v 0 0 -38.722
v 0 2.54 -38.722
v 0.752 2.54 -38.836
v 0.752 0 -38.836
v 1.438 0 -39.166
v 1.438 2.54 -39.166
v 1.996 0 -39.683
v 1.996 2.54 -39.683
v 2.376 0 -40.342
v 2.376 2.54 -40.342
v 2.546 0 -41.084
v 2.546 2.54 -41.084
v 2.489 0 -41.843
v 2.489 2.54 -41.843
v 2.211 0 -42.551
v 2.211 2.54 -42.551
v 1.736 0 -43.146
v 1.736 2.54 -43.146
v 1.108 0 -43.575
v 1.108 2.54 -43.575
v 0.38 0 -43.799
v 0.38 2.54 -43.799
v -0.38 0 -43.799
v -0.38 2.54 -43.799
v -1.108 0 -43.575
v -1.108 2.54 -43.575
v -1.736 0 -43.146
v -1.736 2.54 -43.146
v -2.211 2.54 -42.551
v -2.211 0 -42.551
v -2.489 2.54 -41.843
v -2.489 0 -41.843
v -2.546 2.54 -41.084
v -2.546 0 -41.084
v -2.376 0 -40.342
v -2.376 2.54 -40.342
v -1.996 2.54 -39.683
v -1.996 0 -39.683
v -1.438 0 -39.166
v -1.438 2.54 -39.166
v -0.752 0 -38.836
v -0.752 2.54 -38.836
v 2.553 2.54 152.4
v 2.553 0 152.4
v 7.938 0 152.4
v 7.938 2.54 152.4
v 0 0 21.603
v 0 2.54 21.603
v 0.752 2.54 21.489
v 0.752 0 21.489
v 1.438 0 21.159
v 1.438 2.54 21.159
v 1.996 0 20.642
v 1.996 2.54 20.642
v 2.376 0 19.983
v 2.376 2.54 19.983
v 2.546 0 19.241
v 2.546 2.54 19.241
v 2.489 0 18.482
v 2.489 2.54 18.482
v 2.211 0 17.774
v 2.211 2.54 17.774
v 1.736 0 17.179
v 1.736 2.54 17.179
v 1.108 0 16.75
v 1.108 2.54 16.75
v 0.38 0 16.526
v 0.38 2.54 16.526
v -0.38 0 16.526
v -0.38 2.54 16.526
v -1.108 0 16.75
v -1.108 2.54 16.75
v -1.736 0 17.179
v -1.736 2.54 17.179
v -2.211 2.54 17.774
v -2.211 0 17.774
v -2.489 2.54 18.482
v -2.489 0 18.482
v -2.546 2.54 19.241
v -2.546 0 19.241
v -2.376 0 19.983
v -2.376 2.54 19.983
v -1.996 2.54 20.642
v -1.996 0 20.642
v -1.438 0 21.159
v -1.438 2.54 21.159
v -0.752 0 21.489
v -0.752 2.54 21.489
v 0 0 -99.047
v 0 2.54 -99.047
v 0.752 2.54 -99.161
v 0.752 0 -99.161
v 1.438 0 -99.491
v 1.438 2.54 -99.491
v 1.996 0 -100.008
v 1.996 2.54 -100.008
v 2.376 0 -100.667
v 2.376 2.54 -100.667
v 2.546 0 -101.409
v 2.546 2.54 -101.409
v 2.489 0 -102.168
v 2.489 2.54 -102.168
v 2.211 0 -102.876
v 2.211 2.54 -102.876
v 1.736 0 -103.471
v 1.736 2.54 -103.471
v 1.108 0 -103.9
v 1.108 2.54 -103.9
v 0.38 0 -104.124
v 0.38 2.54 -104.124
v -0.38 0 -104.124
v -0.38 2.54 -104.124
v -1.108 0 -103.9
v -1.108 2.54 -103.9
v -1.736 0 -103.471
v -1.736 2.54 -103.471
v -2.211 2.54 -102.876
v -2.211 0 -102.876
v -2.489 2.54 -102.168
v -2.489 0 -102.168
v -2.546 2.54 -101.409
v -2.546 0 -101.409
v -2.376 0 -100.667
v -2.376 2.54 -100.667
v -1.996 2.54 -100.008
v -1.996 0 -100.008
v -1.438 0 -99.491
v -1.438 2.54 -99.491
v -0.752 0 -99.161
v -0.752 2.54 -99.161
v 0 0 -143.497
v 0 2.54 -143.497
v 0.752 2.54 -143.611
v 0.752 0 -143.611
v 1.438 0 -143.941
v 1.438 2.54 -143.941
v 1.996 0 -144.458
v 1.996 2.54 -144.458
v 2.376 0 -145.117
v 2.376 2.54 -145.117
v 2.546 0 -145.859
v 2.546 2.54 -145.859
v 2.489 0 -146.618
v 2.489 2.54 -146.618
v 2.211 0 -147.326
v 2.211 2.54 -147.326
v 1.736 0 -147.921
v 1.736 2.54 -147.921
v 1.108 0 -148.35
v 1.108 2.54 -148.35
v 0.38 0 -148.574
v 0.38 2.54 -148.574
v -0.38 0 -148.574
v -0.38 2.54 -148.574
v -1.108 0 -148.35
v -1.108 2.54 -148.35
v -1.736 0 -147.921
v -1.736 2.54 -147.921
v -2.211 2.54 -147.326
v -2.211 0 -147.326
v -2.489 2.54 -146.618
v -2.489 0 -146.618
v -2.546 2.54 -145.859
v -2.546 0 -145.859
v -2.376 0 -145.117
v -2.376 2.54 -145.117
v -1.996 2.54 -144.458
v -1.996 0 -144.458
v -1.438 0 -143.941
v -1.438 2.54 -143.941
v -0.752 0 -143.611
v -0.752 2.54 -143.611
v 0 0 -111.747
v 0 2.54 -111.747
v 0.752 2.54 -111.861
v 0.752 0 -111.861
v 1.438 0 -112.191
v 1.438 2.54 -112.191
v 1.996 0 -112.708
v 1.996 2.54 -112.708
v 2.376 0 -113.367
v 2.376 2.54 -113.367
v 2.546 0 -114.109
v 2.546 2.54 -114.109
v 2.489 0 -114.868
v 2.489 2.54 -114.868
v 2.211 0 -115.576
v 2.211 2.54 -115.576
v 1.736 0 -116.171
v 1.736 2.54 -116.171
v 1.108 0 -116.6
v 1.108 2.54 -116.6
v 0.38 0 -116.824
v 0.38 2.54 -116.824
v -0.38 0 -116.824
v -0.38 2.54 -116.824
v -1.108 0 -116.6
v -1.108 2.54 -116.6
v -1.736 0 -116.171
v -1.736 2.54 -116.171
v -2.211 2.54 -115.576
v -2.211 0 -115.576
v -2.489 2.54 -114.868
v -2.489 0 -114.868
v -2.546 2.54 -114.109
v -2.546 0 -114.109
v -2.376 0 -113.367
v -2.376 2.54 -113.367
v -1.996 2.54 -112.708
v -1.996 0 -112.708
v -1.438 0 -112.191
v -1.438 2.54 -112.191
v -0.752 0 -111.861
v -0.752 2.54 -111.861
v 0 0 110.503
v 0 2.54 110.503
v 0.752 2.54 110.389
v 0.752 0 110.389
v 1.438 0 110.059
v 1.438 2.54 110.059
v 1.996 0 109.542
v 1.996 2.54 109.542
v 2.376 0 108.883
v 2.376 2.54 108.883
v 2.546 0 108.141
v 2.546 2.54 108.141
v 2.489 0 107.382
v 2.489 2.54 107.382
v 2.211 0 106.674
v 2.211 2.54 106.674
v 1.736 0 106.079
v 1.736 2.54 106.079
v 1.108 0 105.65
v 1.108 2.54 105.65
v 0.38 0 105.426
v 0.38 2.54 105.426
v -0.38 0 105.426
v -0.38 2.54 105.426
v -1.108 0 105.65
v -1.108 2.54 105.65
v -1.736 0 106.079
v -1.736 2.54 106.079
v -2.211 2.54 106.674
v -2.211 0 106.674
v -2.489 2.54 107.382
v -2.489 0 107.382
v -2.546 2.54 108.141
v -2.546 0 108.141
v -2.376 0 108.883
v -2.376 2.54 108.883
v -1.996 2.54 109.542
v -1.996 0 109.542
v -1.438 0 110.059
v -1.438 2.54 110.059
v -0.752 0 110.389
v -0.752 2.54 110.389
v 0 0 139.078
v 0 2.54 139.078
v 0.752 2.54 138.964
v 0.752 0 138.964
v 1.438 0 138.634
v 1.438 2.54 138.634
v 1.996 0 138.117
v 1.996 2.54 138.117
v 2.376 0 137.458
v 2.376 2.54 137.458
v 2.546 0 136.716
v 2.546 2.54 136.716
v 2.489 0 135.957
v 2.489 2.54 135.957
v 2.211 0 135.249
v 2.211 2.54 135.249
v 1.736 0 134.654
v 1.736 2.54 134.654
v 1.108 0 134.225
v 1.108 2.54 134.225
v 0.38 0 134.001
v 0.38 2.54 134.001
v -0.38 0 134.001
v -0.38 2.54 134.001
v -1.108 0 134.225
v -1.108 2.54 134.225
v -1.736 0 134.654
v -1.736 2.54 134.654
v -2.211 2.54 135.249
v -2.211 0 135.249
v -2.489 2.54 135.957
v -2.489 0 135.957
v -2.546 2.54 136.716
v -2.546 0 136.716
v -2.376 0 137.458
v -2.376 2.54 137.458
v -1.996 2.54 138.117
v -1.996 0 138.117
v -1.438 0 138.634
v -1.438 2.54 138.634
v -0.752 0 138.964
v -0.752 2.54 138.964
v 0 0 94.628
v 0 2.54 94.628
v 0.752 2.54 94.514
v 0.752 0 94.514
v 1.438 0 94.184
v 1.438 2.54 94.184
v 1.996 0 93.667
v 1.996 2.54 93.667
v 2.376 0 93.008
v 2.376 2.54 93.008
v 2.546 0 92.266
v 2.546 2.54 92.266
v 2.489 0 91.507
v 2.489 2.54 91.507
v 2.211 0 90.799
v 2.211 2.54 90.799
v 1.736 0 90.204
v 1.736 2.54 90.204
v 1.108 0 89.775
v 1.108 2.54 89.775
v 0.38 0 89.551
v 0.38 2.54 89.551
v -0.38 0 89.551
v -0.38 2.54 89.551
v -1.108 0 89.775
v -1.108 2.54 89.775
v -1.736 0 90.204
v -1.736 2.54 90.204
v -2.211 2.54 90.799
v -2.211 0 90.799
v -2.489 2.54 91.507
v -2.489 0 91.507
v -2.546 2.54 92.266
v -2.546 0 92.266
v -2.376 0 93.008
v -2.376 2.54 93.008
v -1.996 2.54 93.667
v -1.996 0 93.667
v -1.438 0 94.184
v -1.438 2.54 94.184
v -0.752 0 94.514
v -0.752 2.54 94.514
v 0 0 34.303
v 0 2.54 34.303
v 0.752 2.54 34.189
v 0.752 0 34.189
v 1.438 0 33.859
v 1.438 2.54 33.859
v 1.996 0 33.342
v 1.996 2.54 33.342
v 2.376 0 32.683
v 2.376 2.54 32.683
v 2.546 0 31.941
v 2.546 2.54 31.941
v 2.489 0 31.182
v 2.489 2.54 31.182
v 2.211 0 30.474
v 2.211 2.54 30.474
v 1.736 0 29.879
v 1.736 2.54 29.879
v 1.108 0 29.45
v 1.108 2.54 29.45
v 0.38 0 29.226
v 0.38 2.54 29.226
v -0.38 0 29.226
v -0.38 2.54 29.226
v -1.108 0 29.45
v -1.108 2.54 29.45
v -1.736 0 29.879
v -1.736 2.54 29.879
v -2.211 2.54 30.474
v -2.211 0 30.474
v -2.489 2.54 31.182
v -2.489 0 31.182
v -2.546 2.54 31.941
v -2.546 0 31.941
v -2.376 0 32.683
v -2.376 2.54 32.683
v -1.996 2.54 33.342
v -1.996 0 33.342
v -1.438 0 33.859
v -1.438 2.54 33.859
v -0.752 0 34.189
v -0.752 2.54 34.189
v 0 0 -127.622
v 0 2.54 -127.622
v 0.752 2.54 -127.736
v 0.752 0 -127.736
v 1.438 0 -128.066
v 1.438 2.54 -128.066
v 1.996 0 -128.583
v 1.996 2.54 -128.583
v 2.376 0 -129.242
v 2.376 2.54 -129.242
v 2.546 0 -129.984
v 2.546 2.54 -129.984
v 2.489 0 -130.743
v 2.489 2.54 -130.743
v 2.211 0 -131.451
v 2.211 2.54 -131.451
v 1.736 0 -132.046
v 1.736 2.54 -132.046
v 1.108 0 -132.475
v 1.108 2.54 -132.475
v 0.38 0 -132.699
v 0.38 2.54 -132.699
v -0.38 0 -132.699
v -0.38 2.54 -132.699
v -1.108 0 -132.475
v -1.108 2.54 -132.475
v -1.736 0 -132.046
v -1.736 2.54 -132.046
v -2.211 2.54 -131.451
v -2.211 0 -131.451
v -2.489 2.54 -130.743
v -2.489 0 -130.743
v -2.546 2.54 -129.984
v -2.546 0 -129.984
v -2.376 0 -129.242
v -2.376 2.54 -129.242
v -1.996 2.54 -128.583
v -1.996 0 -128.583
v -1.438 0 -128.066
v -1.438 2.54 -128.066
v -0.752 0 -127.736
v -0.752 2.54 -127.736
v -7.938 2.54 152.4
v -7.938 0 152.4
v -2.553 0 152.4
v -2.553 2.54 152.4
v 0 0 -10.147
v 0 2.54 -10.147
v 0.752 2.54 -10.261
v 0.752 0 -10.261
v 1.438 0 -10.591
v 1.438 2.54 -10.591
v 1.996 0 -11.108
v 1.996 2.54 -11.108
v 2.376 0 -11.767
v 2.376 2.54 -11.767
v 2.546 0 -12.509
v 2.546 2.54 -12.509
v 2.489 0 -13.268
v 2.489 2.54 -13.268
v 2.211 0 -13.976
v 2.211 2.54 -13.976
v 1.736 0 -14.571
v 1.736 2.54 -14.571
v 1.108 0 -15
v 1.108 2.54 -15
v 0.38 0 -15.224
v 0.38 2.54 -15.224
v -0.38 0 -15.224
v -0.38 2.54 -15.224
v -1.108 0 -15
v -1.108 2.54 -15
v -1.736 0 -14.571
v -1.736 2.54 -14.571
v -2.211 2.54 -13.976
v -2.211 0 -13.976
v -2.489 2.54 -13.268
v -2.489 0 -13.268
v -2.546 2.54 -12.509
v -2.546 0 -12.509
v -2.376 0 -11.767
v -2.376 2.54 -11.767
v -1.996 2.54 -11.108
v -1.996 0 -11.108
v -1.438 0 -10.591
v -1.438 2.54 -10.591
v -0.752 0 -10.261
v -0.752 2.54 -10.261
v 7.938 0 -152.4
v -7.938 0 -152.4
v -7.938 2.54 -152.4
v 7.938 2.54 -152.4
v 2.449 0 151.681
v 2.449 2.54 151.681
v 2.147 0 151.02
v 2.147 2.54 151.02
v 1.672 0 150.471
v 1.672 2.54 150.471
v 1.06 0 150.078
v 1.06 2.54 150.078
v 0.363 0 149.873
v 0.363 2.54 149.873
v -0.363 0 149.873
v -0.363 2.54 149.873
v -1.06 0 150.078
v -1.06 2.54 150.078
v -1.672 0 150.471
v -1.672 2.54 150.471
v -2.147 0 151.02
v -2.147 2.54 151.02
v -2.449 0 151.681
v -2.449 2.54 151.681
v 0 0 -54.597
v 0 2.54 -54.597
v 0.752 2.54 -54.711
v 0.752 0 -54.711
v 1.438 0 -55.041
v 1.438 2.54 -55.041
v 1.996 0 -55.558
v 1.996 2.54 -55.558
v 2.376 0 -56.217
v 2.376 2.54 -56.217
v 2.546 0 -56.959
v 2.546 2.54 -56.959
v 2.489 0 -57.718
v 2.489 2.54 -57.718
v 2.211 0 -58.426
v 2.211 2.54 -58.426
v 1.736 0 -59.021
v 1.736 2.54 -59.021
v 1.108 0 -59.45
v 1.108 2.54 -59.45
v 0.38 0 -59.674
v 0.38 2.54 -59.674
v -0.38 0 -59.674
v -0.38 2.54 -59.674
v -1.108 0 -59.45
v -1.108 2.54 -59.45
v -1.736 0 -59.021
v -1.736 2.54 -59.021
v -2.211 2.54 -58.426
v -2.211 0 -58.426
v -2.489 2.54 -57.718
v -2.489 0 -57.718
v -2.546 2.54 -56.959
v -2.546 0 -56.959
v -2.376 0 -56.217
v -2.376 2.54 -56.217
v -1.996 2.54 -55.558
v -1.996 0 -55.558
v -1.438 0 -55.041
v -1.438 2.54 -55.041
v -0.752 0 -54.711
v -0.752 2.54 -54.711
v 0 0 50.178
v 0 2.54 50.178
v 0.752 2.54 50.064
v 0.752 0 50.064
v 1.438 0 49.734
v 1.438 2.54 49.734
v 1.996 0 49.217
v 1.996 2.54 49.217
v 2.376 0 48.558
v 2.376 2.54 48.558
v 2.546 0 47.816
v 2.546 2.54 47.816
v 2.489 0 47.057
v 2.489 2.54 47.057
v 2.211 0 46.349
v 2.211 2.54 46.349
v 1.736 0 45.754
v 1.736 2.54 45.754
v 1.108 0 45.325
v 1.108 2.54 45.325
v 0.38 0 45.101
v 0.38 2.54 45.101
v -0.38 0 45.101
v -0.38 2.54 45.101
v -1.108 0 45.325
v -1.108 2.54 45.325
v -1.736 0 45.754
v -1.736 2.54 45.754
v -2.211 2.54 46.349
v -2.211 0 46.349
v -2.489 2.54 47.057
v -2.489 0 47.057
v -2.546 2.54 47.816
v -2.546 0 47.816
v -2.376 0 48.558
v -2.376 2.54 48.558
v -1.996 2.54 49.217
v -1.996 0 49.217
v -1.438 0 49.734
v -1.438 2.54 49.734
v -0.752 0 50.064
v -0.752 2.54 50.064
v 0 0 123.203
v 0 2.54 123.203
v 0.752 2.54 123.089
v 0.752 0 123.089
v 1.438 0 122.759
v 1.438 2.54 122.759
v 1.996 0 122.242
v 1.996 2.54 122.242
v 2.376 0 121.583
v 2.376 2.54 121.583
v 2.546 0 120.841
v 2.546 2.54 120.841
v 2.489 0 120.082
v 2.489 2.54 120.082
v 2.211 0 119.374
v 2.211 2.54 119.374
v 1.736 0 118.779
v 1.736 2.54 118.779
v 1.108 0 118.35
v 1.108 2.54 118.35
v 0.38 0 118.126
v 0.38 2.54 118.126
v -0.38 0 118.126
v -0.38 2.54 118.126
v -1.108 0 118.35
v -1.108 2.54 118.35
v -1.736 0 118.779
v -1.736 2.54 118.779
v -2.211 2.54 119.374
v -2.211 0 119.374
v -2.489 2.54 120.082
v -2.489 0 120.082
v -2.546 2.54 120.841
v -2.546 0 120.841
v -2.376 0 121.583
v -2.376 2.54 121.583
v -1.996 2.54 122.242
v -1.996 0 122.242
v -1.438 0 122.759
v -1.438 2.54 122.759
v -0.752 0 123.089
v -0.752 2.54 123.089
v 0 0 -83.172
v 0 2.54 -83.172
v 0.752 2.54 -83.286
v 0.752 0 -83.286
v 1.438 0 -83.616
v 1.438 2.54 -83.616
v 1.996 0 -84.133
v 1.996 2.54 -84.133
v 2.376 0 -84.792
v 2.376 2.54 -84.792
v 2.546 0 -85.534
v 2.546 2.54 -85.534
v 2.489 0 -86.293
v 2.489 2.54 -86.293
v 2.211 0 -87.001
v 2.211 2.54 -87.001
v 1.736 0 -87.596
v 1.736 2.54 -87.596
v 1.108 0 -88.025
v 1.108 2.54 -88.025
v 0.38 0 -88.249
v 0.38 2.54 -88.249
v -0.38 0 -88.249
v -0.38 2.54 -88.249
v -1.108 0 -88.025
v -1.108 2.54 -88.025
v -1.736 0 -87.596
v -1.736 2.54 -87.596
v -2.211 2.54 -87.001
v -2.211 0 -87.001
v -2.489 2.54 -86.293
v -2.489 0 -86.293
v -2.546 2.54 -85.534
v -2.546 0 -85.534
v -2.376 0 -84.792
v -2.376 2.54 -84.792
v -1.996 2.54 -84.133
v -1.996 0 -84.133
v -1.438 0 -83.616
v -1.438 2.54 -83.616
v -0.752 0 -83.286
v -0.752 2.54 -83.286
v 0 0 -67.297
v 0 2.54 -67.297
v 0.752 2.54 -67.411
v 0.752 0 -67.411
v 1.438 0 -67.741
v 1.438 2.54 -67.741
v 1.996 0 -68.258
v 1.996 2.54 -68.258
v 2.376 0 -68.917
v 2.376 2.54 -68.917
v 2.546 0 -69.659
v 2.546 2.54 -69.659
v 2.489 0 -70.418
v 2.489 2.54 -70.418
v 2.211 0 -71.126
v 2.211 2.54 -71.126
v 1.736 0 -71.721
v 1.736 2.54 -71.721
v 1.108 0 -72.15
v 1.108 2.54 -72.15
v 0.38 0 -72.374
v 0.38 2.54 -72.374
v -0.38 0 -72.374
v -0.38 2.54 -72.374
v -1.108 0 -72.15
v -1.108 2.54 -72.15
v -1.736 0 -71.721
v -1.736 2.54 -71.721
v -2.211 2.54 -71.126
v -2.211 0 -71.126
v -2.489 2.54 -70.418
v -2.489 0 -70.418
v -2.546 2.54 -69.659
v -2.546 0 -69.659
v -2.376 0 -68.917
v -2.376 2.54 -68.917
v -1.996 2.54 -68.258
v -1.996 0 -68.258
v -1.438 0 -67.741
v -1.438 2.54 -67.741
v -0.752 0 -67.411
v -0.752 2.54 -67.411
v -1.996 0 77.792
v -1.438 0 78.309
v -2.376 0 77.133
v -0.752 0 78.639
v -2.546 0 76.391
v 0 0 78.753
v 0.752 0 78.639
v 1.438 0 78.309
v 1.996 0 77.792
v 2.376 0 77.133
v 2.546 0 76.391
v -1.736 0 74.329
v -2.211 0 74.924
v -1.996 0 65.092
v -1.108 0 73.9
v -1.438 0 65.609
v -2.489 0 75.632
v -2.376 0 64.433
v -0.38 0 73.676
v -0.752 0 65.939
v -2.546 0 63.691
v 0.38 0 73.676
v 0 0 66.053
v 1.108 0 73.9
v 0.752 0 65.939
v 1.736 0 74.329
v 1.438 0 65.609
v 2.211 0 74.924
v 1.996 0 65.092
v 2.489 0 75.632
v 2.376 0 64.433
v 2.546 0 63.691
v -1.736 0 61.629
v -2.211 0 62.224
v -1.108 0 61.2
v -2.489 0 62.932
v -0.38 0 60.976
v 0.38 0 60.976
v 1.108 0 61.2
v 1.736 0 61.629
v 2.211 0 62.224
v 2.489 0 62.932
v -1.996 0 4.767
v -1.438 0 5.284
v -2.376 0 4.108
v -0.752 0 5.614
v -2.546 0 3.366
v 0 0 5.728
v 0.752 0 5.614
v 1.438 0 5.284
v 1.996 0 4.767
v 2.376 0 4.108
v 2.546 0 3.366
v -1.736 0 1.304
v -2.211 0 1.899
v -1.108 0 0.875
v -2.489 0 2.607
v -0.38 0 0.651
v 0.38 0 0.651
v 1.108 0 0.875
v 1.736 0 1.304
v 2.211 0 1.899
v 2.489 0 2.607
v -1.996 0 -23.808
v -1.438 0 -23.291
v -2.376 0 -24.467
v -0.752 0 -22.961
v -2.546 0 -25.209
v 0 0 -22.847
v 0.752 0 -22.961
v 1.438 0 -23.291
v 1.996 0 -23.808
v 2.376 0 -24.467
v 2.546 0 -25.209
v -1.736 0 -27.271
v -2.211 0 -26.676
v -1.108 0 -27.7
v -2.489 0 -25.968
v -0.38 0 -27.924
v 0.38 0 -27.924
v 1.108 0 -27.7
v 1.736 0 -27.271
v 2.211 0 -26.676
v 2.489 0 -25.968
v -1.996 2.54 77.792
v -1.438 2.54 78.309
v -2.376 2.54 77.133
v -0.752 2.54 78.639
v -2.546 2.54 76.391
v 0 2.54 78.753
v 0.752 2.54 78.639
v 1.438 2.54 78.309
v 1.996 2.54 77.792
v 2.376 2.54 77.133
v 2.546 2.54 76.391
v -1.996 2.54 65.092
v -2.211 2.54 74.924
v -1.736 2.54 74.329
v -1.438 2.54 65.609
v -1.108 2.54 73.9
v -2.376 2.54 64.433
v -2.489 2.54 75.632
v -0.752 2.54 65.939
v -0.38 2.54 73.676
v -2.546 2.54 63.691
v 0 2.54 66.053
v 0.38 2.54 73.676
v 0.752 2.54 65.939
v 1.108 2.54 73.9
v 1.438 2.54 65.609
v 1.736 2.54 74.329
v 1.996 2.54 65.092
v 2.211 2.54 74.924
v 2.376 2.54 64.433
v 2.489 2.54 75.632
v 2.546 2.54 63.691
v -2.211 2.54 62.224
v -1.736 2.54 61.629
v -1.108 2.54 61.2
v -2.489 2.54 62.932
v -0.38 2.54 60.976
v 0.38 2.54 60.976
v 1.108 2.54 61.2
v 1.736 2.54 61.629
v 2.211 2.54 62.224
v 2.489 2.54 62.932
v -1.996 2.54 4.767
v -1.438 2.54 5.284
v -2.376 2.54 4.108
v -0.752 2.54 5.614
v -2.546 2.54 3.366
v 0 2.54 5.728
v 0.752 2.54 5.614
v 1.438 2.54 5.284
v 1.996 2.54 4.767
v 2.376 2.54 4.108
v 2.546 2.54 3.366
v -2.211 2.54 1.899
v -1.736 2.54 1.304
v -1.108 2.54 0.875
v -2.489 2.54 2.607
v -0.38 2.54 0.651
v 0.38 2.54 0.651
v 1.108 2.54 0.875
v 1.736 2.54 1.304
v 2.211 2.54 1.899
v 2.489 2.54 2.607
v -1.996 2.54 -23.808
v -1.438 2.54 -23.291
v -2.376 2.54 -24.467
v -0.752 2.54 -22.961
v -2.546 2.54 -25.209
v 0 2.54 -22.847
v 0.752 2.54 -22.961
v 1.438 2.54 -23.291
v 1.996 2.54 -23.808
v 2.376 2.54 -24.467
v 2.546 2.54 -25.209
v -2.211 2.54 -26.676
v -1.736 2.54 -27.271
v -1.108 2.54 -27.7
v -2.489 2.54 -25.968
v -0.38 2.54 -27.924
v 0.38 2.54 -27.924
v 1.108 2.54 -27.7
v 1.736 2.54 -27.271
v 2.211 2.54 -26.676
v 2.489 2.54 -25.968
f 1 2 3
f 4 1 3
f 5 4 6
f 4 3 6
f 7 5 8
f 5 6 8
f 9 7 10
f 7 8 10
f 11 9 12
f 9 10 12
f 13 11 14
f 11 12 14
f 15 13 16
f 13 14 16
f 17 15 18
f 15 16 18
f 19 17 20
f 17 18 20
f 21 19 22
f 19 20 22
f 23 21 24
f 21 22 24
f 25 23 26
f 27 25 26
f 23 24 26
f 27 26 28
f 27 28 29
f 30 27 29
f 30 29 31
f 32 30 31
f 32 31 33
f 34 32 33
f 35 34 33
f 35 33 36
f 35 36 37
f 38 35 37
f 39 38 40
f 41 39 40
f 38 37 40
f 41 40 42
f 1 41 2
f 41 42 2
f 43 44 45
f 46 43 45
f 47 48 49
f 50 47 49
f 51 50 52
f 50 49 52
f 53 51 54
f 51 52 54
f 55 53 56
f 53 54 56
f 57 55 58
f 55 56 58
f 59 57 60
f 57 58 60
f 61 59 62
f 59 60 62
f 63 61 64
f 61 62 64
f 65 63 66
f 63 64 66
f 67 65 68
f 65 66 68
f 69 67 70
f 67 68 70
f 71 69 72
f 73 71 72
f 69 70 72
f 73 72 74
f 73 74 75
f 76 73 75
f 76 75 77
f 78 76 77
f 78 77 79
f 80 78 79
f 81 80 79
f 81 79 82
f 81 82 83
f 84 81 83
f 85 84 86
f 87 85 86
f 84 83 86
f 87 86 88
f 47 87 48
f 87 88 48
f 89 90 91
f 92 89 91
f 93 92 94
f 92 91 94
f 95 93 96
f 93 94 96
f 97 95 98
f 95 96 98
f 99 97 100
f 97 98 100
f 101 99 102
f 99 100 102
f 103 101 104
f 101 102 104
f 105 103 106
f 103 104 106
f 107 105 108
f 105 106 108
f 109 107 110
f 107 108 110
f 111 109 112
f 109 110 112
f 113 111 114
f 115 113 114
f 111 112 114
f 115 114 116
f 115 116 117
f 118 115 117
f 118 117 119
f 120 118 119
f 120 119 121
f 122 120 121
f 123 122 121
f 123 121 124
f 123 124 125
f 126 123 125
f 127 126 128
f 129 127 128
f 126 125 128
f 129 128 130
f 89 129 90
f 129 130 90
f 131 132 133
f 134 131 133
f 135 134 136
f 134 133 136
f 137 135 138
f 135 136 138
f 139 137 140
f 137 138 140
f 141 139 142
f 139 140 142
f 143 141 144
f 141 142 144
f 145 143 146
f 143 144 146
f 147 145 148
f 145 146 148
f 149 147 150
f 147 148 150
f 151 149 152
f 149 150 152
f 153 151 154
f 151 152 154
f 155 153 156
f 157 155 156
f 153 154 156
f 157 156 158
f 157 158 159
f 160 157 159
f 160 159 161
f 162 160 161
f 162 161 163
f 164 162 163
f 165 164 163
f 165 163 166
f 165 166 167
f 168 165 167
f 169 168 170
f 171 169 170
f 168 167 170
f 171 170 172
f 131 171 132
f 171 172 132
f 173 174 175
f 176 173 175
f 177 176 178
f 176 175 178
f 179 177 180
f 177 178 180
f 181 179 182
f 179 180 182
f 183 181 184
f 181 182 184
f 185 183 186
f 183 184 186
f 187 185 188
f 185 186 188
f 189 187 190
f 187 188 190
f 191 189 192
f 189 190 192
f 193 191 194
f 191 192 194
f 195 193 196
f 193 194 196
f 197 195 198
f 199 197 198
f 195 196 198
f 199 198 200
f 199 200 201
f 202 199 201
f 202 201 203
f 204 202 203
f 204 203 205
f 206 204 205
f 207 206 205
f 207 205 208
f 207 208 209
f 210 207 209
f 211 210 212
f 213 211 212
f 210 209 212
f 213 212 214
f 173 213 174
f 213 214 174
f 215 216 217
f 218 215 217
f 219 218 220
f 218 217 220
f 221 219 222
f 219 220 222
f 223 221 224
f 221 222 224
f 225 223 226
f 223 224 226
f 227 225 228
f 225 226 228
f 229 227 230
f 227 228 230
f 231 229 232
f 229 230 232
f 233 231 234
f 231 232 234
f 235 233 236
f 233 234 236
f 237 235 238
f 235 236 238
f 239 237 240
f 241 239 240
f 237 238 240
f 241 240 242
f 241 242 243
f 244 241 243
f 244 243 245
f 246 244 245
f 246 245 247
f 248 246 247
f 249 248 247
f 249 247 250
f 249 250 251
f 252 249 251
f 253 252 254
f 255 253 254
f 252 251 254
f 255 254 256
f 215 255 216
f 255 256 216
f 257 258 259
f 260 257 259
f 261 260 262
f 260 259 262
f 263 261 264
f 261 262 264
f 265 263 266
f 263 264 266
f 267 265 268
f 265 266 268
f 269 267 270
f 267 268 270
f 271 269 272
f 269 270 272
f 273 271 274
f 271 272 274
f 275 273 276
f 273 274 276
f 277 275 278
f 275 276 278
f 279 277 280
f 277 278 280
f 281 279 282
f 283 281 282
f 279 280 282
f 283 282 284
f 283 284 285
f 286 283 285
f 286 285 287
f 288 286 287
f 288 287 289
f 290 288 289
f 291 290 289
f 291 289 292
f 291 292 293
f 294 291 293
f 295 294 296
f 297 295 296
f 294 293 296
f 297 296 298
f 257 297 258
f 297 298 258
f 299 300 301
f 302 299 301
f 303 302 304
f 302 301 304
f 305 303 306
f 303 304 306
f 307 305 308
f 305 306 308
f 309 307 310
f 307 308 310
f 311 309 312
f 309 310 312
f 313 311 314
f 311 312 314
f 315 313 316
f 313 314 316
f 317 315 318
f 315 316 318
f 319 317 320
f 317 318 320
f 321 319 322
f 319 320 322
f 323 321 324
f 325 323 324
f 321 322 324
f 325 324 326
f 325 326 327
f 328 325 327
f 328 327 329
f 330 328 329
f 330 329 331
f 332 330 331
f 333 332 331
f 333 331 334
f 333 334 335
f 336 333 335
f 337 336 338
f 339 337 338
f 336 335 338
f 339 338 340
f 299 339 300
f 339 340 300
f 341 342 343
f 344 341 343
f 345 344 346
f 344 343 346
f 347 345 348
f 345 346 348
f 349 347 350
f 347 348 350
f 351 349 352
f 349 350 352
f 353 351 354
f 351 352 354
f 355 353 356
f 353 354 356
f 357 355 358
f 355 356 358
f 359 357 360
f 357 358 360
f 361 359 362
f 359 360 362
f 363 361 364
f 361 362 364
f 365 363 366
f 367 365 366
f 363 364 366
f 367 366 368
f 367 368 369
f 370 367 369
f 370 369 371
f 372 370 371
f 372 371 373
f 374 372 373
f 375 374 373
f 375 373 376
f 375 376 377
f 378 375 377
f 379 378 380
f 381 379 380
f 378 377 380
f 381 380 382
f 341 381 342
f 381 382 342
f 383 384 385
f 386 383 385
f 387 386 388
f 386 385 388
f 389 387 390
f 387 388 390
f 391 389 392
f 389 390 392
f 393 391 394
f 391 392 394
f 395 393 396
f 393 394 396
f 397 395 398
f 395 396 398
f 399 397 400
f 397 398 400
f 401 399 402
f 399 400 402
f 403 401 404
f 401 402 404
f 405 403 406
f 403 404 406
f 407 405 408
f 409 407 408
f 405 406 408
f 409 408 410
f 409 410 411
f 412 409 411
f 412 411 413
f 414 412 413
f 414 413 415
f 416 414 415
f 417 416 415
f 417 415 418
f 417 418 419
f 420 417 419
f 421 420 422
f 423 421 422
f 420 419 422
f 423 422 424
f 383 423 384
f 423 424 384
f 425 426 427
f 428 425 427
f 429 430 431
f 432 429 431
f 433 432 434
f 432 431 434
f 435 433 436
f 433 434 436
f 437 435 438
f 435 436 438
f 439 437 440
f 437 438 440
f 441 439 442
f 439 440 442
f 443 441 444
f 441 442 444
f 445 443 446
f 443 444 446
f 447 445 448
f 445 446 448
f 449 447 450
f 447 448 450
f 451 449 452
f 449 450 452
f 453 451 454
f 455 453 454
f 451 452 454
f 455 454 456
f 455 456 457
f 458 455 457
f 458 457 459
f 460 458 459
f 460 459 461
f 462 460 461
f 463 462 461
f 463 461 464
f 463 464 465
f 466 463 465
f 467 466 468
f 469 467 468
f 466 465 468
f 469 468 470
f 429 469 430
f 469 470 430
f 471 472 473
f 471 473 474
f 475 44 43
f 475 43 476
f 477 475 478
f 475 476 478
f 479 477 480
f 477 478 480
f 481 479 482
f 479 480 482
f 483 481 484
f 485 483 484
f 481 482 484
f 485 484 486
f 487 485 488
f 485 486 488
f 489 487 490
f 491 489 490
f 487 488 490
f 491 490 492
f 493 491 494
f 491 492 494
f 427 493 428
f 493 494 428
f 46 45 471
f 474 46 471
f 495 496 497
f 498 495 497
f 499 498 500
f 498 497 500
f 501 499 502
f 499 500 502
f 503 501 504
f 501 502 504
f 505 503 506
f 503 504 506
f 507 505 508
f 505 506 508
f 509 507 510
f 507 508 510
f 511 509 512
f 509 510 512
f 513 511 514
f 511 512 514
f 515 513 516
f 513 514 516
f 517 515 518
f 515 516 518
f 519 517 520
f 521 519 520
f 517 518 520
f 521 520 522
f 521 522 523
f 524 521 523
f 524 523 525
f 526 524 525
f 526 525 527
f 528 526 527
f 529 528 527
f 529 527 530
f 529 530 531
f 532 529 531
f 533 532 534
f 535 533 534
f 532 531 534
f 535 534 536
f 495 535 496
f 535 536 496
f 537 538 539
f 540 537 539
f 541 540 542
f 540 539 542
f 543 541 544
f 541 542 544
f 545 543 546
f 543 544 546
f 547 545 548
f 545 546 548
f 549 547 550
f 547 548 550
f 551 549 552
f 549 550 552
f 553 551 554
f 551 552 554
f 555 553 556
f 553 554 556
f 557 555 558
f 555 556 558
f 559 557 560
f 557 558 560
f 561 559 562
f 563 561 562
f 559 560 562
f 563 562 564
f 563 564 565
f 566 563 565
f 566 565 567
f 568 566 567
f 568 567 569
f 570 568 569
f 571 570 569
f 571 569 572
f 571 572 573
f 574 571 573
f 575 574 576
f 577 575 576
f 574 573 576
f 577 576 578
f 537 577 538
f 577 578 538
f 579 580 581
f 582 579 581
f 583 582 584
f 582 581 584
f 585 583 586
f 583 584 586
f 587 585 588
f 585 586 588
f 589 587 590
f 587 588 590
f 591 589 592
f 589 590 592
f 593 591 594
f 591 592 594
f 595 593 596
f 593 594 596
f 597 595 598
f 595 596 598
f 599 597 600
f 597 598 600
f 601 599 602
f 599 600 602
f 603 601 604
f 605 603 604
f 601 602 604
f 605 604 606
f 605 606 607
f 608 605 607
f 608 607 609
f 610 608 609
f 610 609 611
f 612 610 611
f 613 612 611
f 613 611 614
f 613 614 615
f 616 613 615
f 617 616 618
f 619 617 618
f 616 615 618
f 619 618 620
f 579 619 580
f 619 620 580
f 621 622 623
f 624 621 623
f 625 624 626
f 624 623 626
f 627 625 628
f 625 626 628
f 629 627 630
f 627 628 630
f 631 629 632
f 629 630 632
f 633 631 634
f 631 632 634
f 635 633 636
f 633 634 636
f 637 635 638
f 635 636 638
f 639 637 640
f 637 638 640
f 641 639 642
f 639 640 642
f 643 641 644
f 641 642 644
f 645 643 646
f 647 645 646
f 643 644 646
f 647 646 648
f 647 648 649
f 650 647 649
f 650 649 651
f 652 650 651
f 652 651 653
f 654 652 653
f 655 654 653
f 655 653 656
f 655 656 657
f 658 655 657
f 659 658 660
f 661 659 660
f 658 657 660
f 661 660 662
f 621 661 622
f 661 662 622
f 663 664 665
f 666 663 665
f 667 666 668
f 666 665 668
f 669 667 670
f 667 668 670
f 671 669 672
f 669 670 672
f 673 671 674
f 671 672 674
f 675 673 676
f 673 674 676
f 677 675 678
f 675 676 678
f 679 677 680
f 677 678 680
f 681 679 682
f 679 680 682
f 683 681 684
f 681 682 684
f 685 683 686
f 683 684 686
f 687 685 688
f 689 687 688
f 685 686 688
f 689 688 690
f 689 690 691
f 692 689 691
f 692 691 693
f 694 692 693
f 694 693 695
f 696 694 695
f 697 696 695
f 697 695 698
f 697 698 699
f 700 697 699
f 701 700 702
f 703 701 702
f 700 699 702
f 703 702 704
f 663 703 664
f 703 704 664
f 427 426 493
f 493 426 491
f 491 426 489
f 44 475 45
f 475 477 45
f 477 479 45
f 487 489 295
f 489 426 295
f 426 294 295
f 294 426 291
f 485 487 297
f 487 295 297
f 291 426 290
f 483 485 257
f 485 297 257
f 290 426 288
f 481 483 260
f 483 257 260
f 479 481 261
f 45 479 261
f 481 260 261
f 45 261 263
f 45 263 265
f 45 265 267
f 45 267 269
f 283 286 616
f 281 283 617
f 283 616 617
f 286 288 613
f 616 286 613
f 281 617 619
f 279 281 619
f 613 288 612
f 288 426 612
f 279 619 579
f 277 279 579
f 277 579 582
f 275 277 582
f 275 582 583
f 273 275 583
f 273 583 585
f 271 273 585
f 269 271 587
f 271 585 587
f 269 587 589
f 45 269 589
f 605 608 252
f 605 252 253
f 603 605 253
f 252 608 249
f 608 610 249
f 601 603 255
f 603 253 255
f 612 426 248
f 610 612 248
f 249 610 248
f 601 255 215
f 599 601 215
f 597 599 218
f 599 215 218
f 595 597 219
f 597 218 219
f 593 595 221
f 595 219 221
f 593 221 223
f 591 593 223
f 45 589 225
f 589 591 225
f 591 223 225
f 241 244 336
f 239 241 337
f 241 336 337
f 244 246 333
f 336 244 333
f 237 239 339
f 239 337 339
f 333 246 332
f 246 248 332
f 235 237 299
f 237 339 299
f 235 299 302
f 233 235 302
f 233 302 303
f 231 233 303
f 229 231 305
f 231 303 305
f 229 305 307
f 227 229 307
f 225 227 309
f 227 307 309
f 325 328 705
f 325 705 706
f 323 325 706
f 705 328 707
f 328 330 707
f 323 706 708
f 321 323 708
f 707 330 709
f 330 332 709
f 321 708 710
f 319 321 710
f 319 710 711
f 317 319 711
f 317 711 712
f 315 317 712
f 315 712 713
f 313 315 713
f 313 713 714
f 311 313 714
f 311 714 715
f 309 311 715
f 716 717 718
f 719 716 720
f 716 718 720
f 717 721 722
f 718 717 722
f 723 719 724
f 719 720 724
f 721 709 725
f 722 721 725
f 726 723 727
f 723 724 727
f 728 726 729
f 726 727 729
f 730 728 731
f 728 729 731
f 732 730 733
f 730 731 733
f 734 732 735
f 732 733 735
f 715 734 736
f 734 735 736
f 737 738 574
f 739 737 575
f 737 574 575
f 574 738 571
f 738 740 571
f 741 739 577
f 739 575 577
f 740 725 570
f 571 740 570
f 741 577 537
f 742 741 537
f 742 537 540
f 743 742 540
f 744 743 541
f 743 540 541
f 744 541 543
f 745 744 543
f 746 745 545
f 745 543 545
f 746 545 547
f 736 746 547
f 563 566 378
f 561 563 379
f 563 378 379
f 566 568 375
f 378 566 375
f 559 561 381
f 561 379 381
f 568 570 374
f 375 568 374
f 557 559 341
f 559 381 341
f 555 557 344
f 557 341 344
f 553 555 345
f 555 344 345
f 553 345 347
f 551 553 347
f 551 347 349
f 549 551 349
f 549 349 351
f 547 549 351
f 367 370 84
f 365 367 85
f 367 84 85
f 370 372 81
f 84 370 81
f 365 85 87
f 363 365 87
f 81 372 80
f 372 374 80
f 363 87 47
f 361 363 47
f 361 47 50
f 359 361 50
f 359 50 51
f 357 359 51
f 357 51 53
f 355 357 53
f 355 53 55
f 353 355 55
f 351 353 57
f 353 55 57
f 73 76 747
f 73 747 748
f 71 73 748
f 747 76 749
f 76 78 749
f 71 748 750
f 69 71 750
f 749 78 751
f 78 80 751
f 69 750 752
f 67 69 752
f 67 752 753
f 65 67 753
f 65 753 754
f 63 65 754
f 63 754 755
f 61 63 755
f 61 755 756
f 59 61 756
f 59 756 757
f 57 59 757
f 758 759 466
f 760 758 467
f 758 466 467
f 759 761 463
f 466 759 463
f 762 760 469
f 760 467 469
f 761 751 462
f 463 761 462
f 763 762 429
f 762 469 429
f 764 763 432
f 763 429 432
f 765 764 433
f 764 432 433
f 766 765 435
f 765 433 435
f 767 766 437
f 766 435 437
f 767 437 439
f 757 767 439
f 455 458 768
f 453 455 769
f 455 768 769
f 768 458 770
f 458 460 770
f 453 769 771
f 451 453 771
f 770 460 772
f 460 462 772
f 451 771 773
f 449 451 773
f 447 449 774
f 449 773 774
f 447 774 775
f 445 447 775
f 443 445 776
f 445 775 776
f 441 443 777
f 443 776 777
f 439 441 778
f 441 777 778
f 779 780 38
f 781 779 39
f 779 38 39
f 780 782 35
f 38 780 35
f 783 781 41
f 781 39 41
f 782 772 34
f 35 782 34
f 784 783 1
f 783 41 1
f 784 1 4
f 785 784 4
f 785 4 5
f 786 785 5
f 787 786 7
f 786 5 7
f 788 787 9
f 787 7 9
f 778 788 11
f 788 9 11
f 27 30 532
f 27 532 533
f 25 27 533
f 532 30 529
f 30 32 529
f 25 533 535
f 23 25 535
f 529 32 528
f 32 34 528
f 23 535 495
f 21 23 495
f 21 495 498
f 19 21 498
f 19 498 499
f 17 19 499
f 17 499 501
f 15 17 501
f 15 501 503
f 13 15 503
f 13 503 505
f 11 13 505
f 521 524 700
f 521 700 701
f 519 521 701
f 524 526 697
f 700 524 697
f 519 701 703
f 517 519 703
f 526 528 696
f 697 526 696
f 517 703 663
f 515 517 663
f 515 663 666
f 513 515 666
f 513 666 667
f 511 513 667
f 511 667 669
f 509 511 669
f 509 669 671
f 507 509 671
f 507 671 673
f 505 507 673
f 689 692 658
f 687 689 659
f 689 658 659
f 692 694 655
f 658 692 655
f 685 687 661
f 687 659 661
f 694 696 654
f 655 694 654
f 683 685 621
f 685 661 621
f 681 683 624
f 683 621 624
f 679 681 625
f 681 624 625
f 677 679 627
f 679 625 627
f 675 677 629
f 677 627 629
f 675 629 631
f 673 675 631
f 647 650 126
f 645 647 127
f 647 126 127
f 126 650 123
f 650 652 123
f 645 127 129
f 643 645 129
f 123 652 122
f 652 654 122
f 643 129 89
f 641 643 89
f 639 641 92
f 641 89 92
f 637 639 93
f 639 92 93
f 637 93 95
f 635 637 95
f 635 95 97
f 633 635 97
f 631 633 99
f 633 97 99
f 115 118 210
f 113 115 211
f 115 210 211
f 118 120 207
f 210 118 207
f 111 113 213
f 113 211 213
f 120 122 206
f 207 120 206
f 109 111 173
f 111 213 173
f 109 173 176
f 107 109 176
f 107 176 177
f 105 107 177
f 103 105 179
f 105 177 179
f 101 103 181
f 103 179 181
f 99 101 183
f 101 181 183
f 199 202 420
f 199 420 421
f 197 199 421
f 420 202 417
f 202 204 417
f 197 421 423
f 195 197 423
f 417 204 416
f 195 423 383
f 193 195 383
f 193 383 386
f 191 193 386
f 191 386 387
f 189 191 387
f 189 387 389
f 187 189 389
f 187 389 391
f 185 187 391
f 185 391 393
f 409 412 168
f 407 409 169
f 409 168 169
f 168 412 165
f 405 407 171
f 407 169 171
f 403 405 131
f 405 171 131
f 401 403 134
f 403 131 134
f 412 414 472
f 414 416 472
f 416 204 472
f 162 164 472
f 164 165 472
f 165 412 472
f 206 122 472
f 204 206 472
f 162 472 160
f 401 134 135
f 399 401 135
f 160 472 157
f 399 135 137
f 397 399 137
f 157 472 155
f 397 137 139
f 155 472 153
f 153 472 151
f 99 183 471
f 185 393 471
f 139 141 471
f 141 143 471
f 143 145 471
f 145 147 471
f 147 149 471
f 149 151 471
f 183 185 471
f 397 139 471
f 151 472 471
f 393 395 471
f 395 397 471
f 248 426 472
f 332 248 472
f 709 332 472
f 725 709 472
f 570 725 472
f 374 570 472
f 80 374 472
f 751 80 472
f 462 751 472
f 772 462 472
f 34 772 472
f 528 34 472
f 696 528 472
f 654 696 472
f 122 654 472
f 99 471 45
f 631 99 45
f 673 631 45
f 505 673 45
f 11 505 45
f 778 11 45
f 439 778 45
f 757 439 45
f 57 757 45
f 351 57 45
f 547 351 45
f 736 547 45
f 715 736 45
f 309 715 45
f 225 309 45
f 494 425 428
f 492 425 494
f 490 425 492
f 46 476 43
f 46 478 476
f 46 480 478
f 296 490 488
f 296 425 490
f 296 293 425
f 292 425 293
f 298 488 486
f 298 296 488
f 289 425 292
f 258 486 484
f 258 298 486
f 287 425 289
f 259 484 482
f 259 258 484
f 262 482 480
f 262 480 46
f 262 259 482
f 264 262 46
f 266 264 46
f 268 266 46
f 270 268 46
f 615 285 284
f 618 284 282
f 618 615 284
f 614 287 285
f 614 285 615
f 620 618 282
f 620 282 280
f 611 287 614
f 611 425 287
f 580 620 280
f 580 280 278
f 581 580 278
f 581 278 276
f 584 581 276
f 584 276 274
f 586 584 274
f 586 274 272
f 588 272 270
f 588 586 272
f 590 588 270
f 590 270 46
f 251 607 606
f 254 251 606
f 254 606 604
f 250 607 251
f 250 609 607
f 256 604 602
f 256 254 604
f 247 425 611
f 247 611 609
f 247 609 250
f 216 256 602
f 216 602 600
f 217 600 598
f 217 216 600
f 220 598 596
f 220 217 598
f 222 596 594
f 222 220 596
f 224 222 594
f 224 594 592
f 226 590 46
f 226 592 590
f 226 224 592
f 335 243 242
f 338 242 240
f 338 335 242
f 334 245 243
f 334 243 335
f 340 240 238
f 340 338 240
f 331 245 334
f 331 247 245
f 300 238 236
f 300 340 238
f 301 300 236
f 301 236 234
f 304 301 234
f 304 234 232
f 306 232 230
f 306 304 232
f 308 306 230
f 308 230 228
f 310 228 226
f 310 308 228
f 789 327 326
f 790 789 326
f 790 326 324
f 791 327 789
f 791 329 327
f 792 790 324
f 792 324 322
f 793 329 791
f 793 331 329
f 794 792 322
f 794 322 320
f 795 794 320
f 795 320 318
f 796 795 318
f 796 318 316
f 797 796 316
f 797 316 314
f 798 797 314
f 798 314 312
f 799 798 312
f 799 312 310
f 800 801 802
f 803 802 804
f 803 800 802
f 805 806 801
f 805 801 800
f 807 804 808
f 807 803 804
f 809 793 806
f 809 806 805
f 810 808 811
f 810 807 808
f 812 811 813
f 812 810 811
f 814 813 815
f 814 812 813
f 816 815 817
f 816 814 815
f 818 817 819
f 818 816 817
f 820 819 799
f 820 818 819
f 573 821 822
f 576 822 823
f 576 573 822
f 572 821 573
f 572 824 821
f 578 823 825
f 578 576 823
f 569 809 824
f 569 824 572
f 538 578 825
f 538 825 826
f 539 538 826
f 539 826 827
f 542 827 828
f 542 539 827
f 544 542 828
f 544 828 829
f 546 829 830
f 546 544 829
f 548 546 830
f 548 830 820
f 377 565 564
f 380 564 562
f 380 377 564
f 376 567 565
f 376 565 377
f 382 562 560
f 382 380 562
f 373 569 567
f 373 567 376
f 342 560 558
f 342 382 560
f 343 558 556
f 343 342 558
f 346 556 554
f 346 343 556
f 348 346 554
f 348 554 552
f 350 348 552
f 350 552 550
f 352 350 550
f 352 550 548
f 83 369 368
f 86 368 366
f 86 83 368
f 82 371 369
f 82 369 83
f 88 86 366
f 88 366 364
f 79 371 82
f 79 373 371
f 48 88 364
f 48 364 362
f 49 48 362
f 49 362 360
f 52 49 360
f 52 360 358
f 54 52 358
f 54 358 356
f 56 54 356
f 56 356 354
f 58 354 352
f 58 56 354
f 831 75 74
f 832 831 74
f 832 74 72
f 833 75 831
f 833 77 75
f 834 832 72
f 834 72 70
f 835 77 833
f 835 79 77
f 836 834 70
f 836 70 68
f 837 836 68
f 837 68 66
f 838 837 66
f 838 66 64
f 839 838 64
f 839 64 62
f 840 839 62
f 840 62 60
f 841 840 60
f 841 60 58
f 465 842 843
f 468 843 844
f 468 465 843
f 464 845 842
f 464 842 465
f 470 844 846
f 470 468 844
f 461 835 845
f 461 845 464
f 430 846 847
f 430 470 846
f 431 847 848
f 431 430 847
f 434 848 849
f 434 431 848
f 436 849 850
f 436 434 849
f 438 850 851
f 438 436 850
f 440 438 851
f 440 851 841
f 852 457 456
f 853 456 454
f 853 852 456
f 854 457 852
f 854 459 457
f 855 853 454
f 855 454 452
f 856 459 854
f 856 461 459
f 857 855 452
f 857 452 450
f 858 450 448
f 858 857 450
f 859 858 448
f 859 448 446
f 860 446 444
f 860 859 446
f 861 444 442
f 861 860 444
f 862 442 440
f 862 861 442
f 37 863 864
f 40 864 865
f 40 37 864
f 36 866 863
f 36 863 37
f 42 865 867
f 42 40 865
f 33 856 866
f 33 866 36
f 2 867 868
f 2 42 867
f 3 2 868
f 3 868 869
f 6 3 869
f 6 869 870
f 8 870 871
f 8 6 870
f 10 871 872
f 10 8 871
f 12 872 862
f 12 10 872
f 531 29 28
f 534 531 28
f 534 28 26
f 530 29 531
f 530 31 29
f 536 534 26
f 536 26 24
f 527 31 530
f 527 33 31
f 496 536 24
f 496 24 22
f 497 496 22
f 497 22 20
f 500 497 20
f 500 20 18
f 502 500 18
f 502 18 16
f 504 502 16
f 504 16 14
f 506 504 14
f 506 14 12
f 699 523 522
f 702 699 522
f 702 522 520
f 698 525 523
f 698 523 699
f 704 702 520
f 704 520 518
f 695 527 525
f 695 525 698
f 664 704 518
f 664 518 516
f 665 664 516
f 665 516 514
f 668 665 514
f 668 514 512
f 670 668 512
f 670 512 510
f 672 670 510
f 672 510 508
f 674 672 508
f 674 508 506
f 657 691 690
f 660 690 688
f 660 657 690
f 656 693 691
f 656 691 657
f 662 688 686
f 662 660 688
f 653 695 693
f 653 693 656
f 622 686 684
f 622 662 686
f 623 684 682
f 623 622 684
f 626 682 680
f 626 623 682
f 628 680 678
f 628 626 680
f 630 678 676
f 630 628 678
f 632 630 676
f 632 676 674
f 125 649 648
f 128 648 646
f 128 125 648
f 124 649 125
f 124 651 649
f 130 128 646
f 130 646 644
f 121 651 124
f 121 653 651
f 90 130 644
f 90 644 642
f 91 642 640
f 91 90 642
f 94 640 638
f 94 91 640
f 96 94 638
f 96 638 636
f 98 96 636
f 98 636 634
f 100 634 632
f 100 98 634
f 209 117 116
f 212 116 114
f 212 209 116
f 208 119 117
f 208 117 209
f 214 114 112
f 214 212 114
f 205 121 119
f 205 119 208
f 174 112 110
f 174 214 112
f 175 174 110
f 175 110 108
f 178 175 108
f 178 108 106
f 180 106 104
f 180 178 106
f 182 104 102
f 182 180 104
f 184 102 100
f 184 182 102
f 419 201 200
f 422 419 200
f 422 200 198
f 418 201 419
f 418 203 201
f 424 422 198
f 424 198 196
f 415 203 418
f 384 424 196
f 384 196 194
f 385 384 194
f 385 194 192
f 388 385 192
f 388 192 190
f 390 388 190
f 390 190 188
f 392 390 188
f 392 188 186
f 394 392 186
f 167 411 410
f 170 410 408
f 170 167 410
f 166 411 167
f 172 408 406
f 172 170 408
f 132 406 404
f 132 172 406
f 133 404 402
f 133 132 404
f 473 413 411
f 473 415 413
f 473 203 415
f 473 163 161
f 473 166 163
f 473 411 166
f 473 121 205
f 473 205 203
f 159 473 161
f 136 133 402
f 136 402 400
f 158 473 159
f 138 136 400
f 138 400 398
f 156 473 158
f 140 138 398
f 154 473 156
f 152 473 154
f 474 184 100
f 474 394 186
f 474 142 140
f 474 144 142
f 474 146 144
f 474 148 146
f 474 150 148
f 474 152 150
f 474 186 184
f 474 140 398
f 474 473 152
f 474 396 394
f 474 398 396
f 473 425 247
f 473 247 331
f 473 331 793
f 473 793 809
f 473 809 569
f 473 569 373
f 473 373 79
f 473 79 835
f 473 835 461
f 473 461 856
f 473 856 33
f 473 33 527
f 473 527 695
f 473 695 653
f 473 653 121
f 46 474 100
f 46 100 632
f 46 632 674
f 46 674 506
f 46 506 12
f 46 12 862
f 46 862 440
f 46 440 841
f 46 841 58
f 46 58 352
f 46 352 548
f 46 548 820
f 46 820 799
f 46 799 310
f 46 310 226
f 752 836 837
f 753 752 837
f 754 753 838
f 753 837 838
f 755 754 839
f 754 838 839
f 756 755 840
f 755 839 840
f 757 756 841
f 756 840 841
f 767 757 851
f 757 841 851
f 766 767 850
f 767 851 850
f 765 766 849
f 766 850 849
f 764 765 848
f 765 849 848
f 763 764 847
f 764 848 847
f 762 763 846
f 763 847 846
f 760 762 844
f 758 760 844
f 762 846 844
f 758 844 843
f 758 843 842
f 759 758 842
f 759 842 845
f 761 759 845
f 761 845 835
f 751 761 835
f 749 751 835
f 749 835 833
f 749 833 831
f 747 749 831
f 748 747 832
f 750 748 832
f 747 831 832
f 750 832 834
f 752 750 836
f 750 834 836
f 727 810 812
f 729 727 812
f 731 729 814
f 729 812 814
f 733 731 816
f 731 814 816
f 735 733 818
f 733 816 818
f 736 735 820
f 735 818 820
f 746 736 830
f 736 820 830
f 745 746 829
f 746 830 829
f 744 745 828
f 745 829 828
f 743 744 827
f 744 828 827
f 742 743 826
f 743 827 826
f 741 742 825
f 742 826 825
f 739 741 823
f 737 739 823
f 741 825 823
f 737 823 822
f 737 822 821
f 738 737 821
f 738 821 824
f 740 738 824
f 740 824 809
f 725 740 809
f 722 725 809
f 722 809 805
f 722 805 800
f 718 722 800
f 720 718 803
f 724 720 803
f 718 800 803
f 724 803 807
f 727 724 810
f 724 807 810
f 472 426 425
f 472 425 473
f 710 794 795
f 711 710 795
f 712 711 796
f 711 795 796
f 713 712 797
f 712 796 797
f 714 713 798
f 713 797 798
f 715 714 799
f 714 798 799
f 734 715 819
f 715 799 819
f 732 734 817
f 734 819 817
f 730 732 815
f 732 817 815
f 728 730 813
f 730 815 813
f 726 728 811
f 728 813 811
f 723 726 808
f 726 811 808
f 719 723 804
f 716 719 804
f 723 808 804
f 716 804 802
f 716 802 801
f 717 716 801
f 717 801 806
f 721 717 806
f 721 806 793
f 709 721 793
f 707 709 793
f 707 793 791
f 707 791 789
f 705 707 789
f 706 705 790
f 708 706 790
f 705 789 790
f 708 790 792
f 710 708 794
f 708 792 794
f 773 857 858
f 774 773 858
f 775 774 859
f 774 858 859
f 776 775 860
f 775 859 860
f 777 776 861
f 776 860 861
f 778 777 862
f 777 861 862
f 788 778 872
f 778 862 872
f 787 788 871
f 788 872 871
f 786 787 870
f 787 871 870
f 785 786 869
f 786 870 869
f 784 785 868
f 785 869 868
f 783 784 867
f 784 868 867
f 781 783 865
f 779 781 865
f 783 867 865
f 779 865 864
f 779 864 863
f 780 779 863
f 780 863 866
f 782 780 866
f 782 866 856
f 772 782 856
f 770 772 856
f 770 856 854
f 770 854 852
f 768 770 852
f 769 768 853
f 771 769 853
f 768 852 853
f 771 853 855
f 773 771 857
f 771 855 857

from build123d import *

# Parameters (mm, degrees)
SKETCH1_W                  = 15.875
SKETCH1_H                  = 304.8
BOSS_EXTRUDE1_DEPTH        = 2.54
SKETCH2_R                  = 2.5527
CUT_EXTRUDE1_DEPTH         = 2.54
LPATTERN1_COUNT            = 3
LPATTERN1_PITCH            = 15.875
LPATTERN2_COUNT            = 7
LPATTERN2_PITCH            = 44.45
LPATTERN2_COPY_1_SKETCH_R  = 2.5527
LPATTERN2_COPY_1_DEPTH     = 2.54
LPATTERN2_COPY_2_SKETCH_R  = 2.5527
LPATTERN2_COPY_2_DEPTH     = 2.54
LPATTERN2_COPY_3_SKETCH_R  = 2.5527
LPATTERN2_COPY_3_DEPTH     = 2.54
LPATTERN2_COPY_4_SKETCH_R  = 2.5527
LPATTERN2_COPY_4_DEPTH     = 2.54
LPATTERN2_COPY_5_SKETCH_R  = 2.5527
LPATTERN2_COPY_5_DEPTH     = 2.54
LPATTERN2_COPY_6_SKETCH_R  = 2.5527
LPATTERN2_COPY_6_DEPTH     = 2.54
LPATTERN2_COPY_7_SKETCH_R  = 2.5527
LPATTERN2_COPY_7_DEPTH     = 2.54
LPATTERN2_COPY_8_SKETCH_R  = 2.5527
LPATTERN2_COPY_8_DEPTH     = 2.54
LPATTERN2_COPY_9_SKETCH_R  = 2.5527
LPATTERN2_COPY_9_DEPTH     = 2.54
LPATTERN2_COPY_10_SKETCH_R = 2.5527
LPATTERN2_COPY_10_DEPTH    = 2.54
LPATTERN2_COPY_11_SKETCH_R = 2.5527
LPATTERN2_COPY_11_DEPTH    = 2.54
LPATTERN2_COPY_12_SKETCH_R = 2.5527
LPATTERN2_COPY_12_DEPTH    = 2.54


with BuildPart() as part:
    # Sketch1 → Boss-Extrude1 (new body)
    with BuildSketch(Plane(origin=(0, 0, 0), x_dir=(1, 0, 0), z_dir=(0, 1, 0))):
        Rectangle(SKETCH1_W, SKETCH1_H)
    extrude(amount=BOSS_EXTRUDE1_DEPTH)

    # Sketch2 → Cut-Extrude1 (cut)
    with BuildSketch(Plane(origin=(0, 2.54, 0), x_dir=(1, 0, 0), z_dir=(0, 1, 0))):
        with Locations(Location((0, 146.05, 0), (0, 0, 270))):
            Circle(SKETCH2_R)
    cut_extrude1 = extrude(amount=-CUT_EXTRUDE1_DEPTH, mode=Mode.SUBTRACT)

    # LPattern1: Cut-Extrude1 ×3
    with Locations(*[(0, 0, i * LPATTERN1_PITCH) for i in range(1, LPATTERN1_COUNT)]):
        add(cut_extrude1, mode=Mode.SUBTRACT)

    # LPattern2: Cut-Extrude1 ×7
    with Locations(*[(0, 0, i * LPATTERN2_PITCH) for i in range(1, LPATTERN2_COUNT)]):
        add(cut_extrude1, mode=Mode.SUBTRACT)

    # LPattern2 copy 1 sketch → LPattern2 copy 1 (cut)
    with BuildSketch(Plane(origin=(0, 2.54, 60.325), x_dir=(1, 0, 0), z_dir=(0, 1, 0))):
        with Locations(Location((0, 146.05, 0), (0, 0, 270))):
            Circle(LPATTERN2_COPY_1_SKETCH_R)
    extrude(amount=-LPATTERN2_COPY_1_DEPTH, mode=Mode.SUBTRACT)

    # LPattern2 copy 2 sketch → LPattern2 copy 2 (cut)
    with BuildSketch(Plane(origin=(0, 2.54, 104.775), x_dir=(1, 0, 0), z_dir=(0, 1, 0))):
        with Locations(Location((0, 146.05, 0), (0, 0, 270))):
            Circle(LPATTERN2_COPY_2_SKETCH_R)
    extrude(amount=-LPATTERN2_COPY_2_DEPTH, mode=Mode.SUBTRACT)

    # LPattern2 copy 3 sketch → LPattern2 copy 3 (cut)
    with BuildSketch(Plane(origin=(0, 2.54, 149.225), x_dir=(1, 0, 0), z_dir=(0, 1, 0))):
        with Locations(Location((0, 146.05, 0), (0, 0, 270))):
            Circle(LPATTERN2_COPY_3_SKETCH_R)
    extrude(amount=-LPATTERN2_COPY_3_DEPTH, mode=Mode.SUBTRACT)

    # LPattern2 copy 4 sketch → LPattern2 copy 4 (cut)
    with BuildSketch(Plane(origin=(0, 2.54, 193.675), x_dir=(1, 0, 0), z_dir=(0, 1, 0))):
        with Locations(Location((0, 146.05, 0), (0, 0, 270))):
            Circle(LPATTERN2_COPY_4_SKETCH_R)
    extrude(amount=-LPATTERN2_COPY_4_DEPTH, mode=Mode.SUBTRACT)

    # LPattern2 copy 5 sketch → LPattern2 copy 5 (cut)
    with BuildSketch(Plane(origin=(0, 2.54, 238.125), x_dir=(1, 0, 0), z_dir=(0, 1, 0))):
        with Locations(Location((0, 146.05, 0), (0, 0, 270))):
            Circle(LPATTERN2_COPY_5_SKETCH_R)
    extrude(amount=-LPATTERN2_COPY_5_DEPTH, mode=Mode.SUBTRACT)

    # LPattern2 copy 6 sketch → LPattern2 copy 6 (cut)
    with BuildSketch(Plane(origin=(0, 2.54, 282.575), x_dir=(1, 0, 0), z_dir=(0, 1, 0))):
        with Locations(Location((0, 146.05, 0), (0, 0, 270))):
            Circle(LPATTERN2_COPY_6_SKETCH_R)
    extrude(amount=-LPATTERN2_COPY_6_DEPTH, mode=Mode.SUBTRACT)

    # LPattern2 copy 7 sketch → LPattern2 copy 7 (cut)
    with BuildSketch(Plane(origin=(0, 2.54, 76.2), x_dir=(1, 0, 0), z_dir=(0, 1, 0))):
        with Locations(Location((0, 146.05, 0), (0, 0, 270))):
            Circle(LPATTERN2_COPY_7_SKETCH_R)
    extrude(amount=-LPATTERN2_COPY_7_DEPTH, mode=Mode.SUBTRACT)

    # LPattern2 copy 8 sketch → LPattern2 copy 8 (cut)
    with BuildSketch(Plane(origin=(0, 2.54, 120.65), x_dir=(1, 0, 0), z_dir=(0, 1, 0))):
        with Locations(Location((0, 146.05, 0), (0, 0, 270))):
            Circle(LPATTERN2_COPY_8_SKETCH_R)
    extrude(amount=-LPATTERN2_COPY_8_DEPTH, mode=Mode.SUBTRACT)

    # LPattern2 copy 9 sketch → LPattern2 copy 9 (cut)
    with BuildSketch(Plane(origin=(0, 2.54, 165.1), x_dir=(1, 0, 0), z_dir=(0, 1, 0))):
        with Locations(Location((0, 146.05, 0), (0, 0, 270))):
            Circle(LPATTERN2_COPY_9_SKETCH_R)
    extrude(amount=-LPATTERN2_COPY_9_DEPTH, mode=Mode.SUBTRACT)

    # LPattern2 copy 10 sketch → LPattern2 copy 10 (cut)
    with BuildSketch(Plane(origin=(0, 2.54, 209.55), x_dir=(1, 0, 0), z_dir=(0, 1, 0))):
        with Locations(Location((0, 146.05, 0), (0, 0, 270))):
            Circle(LPATTERN2_COPY_10_SKETCH_R)
    extrude(amount=-LPATTERN2_COPY_10_DEPTH, mode=Mode.SUBTRACT)

    # LPattern2 copy 11 sketch → LPattern2 copy 11 (cut)
    with BuildSketch(Plane(origin=(0, 2.54, 254), x_dir=(1, 0, 0), z_dir=(0, 1, 0))):
        with Locations(Location((0, 146.05, 0), (0, 0, 270))):
            Circle(LPATTERN2_COPY_11_SKETCH_R)
    extrude(amount=-LPATTERN2_COPY_11_DEPTH, mode=Mode.SUBTRACT)

    # LPattern2 copy 12 sketch → LPattern2 copy 12 (cut)
    with BuildSketch(Plane(origin=(0, 2.54, 298.45), x_dir=(1, 0, 0), z_dir=(0, 1, 0))):
        with Locations(Location((0, 146.05, 0), (0, 0, 270))):
            Circle(LPATTERN2_COPY_12_SKETCH_R)
    extrude(amount=-LPATTERN2_COPY_12_DEPTH, mode=Mode.SUBTRACT)


solid = part.part
